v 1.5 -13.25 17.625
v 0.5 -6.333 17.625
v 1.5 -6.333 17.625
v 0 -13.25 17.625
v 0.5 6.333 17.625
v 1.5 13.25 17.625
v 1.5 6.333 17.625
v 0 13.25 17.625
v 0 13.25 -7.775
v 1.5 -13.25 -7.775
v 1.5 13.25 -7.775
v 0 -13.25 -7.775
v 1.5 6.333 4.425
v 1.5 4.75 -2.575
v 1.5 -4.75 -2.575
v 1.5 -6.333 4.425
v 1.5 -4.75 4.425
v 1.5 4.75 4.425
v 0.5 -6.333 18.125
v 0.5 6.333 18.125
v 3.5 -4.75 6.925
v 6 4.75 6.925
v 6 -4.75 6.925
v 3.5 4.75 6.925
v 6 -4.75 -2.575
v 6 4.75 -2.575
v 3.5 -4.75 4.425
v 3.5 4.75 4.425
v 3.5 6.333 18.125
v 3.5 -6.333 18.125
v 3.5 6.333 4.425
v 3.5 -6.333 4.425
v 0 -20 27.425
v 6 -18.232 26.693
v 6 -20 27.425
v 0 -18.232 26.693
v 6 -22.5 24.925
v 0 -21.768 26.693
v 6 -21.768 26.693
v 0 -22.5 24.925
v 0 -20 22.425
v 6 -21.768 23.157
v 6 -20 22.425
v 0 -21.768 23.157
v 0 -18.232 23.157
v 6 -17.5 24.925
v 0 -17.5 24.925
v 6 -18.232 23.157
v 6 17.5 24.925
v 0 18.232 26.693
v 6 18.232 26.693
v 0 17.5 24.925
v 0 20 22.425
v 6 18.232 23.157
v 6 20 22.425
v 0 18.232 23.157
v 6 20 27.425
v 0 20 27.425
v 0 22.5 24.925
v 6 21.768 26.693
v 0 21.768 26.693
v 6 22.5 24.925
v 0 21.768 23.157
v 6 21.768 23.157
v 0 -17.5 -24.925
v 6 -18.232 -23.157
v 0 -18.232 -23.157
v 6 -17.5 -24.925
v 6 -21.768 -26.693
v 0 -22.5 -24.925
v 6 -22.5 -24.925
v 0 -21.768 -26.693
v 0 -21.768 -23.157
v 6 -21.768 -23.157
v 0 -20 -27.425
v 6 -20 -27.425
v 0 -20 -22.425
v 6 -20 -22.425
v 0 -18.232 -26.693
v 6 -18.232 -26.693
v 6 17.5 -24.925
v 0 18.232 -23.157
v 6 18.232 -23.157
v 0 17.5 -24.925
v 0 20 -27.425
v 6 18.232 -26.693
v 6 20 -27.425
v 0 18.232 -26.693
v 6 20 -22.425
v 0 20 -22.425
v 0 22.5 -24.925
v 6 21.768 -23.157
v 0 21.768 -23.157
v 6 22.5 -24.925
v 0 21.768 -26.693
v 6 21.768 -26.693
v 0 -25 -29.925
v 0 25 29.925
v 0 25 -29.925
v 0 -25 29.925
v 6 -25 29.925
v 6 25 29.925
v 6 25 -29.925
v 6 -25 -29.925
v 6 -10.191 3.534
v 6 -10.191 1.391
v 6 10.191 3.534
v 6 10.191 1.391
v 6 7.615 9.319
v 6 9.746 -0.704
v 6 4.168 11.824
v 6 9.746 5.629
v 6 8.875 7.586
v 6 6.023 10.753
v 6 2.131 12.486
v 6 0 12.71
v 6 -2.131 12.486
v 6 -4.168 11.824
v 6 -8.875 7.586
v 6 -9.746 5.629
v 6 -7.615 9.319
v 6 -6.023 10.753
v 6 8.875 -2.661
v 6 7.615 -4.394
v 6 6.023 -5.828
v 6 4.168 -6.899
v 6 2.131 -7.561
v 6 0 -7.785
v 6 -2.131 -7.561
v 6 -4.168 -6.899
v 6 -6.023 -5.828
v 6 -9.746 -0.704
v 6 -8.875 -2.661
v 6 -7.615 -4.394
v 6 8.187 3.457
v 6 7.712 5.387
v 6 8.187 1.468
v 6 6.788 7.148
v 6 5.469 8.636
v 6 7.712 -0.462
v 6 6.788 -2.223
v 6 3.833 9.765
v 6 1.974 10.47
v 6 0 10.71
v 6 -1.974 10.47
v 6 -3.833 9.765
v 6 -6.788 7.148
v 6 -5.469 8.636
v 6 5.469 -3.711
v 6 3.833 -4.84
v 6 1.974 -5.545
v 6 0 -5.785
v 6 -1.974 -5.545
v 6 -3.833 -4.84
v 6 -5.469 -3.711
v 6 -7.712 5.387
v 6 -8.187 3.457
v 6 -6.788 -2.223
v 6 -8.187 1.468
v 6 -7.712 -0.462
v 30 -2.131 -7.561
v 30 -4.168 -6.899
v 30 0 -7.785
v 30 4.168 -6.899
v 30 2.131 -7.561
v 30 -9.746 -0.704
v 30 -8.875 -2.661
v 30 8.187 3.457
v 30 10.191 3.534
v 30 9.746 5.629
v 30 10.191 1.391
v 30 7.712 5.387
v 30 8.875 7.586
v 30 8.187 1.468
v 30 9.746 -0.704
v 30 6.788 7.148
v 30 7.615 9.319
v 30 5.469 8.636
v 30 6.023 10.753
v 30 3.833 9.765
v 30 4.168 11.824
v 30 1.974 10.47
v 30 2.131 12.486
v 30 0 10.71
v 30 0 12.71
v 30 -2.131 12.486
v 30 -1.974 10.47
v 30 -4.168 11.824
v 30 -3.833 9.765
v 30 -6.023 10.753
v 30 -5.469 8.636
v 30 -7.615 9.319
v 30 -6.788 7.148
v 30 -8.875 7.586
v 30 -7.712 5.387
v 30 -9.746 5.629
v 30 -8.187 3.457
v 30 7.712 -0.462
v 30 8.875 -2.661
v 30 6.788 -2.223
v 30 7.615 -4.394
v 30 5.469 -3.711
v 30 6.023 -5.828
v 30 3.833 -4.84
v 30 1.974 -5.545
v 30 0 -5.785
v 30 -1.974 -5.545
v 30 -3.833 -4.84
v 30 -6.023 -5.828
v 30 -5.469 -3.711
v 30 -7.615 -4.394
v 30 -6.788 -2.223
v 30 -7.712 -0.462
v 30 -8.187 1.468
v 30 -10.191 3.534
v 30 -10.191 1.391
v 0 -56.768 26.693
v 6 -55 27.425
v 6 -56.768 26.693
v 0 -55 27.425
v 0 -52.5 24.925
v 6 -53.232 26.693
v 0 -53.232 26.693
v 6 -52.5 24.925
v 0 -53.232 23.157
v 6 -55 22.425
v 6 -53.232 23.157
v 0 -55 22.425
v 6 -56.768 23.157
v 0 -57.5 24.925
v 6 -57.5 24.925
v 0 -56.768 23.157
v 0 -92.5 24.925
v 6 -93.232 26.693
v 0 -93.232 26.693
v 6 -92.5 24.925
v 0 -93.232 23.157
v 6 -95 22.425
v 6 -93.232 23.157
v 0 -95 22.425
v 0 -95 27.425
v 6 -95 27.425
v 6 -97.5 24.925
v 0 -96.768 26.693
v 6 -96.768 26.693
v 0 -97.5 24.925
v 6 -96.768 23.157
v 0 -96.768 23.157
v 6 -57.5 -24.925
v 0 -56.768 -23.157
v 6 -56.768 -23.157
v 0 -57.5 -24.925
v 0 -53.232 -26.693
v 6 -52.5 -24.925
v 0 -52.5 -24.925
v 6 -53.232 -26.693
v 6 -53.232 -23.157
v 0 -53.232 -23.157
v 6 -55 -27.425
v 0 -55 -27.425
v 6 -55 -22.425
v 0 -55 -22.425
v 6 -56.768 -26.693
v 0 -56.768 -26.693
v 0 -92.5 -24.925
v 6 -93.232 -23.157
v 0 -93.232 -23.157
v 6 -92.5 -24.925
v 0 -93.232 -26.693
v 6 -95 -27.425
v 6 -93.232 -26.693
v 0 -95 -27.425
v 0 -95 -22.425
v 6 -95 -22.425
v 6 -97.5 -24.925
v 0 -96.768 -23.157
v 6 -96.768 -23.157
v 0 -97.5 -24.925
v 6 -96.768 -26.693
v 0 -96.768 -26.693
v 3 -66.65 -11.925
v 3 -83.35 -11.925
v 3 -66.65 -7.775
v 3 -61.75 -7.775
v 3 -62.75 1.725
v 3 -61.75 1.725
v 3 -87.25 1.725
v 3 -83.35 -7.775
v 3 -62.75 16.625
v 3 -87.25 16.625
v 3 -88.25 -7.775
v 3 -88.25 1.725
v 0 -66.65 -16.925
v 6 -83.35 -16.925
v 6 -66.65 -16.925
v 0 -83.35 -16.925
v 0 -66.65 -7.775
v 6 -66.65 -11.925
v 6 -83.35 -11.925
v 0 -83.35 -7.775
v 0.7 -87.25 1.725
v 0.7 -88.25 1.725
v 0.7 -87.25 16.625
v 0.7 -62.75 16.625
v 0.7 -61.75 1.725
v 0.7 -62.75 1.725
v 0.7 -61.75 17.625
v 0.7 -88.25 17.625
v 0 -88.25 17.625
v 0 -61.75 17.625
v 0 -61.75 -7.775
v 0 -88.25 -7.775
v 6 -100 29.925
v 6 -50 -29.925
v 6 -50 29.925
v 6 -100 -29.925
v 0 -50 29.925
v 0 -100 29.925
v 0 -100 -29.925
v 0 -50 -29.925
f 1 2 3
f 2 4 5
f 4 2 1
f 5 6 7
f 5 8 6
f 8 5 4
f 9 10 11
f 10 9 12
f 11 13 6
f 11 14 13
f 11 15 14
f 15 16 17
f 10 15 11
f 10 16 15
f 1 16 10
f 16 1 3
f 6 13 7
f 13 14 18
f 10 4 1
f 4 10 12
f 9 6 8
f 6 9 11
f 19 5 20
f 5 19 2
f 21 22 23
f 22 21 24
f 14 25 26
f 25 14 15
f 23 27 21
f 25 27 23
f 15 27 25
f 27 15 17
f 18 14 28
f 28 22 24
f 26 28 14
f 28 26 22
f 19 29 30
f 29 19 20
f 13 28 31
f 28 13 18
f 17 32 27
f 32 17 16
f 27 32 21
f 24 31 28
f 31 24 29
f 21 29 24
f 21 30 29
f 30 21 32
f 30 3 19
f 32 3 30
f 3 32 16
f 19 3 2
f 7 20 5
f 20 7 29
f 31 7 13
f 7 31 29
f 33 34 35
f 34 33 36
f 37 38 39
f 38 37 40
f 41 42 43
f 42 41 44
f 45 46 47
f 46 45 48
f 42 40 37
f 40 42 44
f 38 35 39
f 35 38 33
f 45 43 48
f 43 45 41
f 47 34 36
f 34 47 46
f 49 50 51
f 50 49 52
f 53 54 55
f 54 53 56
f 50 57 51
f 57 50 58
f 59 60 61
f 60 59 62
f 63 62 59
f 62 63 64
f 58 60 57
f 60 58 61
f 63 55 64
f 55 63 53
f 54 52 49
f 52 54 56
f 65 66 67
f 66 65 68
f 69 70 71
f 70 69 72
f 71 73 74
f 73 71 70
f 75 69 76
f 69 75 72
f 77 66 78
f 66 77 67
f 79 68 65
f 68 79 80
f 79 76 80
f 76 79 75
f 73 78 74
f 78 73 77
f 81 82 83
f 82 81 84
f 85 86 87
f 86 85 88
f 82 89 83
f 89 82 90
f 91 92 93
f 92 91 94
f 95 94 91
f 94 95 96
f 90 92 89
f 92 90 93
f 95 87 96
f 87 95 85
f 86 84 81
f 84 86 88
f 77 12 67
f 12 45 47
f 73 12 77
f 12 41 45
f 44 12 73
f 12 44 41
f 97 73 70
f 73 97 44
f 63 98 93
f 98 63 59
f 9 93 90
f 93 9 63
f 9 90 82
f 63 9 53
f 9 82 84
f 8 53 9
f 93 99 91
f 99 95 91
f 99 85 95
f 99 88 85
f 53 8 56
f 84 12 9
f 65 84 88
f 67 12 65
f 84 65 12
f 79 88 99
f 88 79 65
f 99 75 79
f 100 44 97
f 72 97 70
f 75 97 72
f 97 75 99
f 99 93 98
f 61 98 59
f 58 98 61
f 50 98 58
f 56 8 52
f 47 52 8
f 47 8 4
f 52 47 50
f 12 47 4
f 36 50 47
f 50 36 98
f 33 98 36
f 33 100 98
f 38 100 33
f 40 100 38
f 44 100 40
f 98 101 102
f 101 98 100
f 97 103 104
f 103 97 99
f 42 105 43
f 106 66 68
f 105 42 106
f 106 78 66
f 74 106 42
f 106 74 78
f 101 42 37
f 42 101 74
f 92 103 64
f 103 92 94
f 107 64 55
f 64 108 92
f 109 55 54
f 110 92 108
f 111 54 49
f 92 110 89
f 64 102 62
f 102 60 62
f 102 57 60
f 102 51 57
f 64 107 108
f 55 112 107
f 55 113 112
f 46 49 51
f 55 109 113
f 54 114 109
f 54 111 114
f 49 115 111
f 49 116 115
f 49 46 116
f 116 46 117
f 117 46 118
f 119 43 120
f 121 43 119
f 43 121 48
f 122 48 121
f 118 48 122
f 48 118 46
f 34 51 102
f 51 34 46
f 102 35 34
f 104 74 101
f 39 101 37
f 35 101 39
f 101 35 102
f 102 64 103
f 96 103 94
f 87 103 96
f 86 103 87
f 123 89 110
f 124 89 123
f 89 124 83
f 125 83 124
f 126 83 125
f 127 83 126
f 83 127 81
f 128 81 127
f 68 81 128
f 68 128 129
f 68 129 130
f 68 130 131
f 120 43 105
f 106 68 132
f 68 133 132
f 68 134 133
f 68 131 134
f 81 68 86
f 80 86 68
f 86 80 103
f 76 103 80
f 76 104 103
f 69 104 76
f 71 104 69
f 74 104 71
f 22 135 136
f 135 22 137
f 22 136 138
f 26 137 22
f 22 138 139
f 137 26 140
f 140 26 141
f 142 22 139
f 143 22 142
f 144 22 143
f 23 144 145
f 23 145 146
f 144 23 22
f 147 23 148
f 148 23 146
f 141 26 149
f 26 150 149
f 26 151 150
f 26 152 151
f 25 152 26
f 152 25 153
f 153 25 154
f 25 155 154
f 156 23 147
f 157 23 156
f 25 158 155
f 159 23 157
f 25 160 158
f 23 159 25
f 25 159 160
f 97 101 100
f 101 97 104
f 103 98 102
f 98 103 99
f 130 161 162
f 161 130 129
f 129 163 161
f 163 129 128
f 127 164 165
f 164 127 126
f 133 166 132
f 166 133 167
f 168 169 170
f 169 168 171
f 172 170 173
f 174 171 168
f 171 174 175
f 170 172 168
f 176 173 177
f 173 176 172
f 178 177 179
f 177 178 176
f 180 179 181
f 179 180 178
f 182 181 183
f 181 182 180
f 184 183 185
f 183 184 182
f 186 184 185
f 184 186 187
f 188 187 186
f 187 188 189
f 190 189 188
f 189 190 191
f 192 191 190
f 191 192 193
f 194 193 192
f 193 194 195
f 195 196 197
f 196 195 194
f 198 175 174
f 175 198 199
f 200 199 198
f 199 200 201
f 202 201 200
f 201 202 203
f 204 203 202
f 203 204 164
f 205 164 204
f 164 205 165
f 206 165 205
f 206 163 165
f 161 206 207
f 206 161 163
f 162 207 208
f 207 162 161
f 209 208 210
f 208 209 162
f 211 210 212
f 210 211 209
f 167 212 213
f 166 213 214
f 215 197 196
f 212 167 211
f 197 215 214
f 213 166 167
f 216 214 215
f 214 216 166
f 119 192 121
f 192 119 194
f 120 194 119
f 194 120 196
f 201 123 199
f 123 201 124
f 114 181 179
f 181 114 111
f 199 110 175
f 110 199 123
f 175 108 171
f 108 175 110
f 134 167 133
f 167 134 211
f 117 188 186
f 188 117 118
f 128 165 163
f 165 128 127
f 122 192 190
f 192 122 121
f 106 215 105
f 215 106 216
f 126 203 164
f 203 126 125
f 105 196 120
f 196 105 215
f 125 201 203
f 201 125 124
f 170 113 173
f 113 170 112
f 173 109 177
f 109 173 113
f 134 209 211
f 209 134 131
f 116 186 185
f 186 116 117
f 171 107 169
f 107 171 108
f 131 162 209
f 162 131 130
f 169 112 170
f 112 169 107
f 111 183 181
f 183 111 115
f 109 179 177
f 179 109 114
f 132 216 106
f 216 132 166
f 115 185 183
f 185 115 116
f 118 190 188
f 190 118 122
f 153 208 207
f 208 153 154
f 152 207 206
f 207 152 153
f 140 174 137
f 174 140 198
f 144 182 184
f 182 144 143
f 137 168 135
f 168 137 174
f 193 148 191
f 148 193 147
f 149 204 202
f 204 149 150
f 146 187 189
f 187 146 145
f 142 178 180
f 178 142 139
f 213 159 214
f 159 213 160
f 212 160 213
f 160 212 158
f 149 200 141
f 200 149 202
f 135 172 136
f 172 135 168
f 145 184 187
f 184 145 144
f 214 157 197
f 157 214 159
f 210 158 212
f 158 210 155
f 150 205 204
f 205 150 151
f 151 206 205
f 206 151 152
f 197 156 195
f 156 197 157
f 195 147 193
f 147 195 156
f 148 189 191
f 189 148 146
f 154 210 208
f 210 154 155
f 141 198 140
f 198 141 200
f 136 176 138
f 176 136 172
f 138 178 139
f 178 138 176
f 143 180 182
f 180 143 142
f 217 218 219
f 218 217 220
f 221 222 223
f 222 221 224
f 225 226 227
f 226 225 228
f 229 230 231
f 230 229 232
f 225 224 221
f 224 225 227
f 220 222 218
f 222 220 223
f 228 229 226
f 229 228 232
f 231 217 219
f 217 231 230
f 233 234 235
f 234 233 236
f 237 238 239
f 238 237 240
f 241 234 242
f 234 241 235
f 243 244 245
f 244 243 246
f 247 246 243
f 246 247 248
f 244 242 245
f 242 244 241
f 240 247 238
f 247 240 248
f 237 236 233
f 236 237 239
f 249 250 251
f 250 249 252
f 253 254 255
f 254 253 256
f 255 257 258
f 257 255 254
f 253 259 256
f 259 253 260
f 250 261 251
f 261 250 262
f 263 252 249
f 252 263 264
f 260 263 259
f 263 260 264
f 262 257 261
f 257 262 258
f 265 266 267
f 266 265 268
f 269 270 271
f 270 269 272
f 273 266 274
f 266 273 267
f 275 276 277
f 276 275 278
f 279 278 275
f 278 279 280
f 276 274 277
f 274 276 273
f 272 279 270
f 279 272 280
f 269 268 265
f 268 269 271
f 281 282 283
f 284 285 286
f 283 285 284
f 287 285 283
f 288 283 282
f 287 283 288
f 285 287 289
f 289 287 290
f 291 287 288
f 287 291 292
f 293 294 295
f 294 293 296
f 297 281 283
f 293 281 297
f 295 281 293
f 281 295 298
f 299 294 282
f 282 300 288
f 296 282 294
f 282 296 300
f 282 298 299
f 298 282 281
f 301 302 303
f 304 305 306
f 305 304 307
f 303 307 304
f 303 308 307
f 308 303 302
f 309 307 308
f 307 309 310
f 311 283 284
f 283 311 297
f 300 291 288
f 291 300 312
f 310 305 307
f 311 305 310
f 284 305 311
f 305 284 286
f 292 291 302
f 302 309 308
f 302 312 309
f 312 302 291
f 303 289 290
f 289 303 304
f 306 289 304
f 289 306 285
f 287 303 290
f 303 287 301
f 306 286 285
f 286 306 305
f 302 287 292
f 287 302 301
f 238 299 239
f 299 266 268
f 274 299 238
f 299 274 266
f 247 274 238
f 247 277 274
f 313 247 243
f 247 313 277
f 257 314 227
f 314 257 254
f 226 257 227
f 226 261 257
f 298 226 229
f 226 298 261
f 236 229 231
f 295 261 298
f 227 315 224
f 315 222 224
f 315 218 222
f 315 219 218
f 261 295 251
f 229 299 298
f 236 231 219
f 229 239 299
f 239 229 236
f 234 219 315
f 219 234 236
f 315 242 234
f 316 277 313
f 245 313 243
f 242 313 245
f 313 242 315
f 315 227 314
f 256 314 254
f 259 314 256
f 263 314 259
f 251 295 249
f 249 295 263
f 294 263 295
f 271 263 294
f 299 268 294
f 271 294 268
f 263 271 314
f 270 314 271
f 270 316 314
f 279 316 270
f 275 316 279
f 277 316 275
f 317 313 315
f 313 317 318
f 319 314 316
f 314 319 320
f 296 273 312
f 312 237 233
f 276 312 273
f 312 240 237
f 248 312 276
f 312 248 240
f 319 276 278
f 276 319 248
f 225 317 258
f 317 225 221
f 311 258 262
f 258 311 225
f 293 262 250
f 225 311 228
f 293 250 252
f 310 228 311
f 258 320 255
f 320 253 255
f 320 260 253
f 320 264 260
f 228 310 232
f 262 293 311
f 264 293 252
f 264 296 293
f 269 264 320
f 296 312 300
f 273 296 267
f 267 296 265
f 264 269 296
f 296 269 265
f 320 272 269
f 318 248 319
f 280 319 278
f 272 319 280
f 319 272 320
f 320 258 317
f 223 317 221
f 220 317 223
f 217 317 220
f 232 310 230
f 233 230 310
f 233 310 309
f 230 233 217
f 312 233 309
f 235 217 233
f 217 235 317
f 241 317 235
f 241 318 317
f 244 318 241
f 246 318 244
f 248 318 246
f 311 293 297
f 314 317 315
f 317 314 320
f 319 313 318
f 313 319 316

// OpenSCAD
// file: ../cameramount/PiCameraMount.scad
/*
 * openSCAD for a simple mount for the Raspberry PI Camera Module
 *
 * This file is not for standalone use - it's included in to another
 * openSCAN file for including in to another model.
 *
 * Copyright 2015 Peter T Mount
 * 
 * Licensed under the Apache License, Version 2.0 (the "License");
 * you may not use this file except in compliance with the License.
 * You may obtain a copy of the License at
 * 
 * http://www.apache.org/licenses/LICENSE-2.0
 * 
 * Unless required by applicable law or agreed to in writing, software
 * distributed under the License is distributed on an "AS IS" BASIS,
 * WITHOUT WARRANTIES OR CONDITIONS OF ANY KIND, either express or implied.
 * See the License for the specific language governing permissions and
 * limitations under the License.
 *
 */

/*
 * Measured dimensions of a PI Camera Module.
 *
 * These are based on actual measurements and those manually measured by Gert van Loo
 * and published on Scribd:
 *
 *		http://www.scribd.com/doc/142718448/Raspberry-Pi-Camera-Mechanical-Data
 *
 * Width & Depth are the exterior dimensions, width being the edge with the ribbon.
 *
 * We add 1.5 to these to give some room and account for the printer as it seems
 * to give a better fit.
 *
 * y offset is the height from the bottom of the center of the camera lens.
 *
 * ribbon width is just that, if required
 */
piCameraWidth=25 +1.5;
piCameraDepth=23.9 +1.5;
piCameraRibbonWidth=16.2 +0.5;
piCameraLensSize=8 +1.5;
piCameraYOffset=5.1+(piCameraLensSize/2);

/*
 * Module to render a PI camera mount.
 *
 * To use translate it into the required position so that the camera lens
 * is at the origin & pointing along the x axis.
 *
 * Then call piCameraMount(radius,mode)
 *
 * Where:
 *		width	the width of the component
 *		mode	The mode of the render
 *
 * The width must be >30mm as it's used to include the mounting hardware.
 * However you can enlarge it.
 *
 * The mode defines how it's rendered:
 *		0	Render the front panel
 *		1	Render the back panel
 *		2	Render a plain panel with just the mounting holes
 *    3	As 1 but cable exit on back is internal rather than at the bottom of the plate
 */

module piCamera(width,mode) {
	assign(
		tubeRadius=width/2,
		piCameraLensHalf=piCameraLensSize/2,
		piCameraWHalf=piCameraWidth/2,
		piCameraDHalf=piCameraDepth/2,
		offset=piCameraYOffset
	) {
		translate([0,0,piCameraYOffset/2]) union() {
			// Front panel
			difference() {
				if(mode==1 || mode==3)
					translate([6,-tubeRadius,-tubeRadius-offset]) cube([6,width,width+offset]);
				else
					translate([0,-tubeRadius,-tubeRadius-offset]) cube([6,width,width+offset]);

//				translate([4,-tubeRadius-1,-tubeRadius-offset-1]) cube([2,width+2,width+offset+2]);

				if(mode!=2) {
					// Holder for the pi camera module
					translate([4.5,-piCameraWHalf,-piCameraDHalf])
						cube([2.2,piCameraWidth,piCameraDepth]);

					// Holder for components on rear of module
					translate([6,1-piCameraWHalf,1-piCameraDHalf])
						cube([3,piCameraWidth-2,piCameraDepth-2]);
					translate([6,-piCameraWHalf,-piCameraDHalf])
						cube([3,piCameraWidth,9.5]);

					// Hole for the camera lens
					translate([-0.5,-piCameraLensHalf,2-piCameraLensSize])
						cube([6,piCameraLensSize,piCameraLensSize]);

					// Indent for ribbon holder on front of the module
					translate([2.5,-piCameraLensSize*2/3,-0.5])
						cube([3,piCameraLensSize*4/3,piCameraDHalf+1]);
		
					// Space for ribbon cable
					if(mode==1)
						translate([ 5, -piCameraRibbonWidth/2,-tubeRadius-1-offset])
							cube([3,piCameraRibbonWidth,tubeRadius+1+offset]);
					else if(mode==3) {
						translate([ 5, -piCameraRibbonWidth/2,14-tubeRadius-1-offset])
							cube([4,piCameraRibbonWidth,15]);
						translate([ 5, -piCameraRibbonWidth/2,14-tubeRadius-1-offset])
							cube([10,piCameraRibbonWidth,5]);
					}
				}

				// M4 mounting holes
				piCameraHoles(width,15);
			}
		}

	}
}

module piCameraHoles(width,h) {
	assign(tubeRadius=width/2) {
		for(h=[0:3])
			translate([-1,
				(h%2) ? (-tubeRadius+5) : (tubeRadius-5),
				(floor(h/2)) ? (-tubeRadius+5-piCameraYOffset) : (tubeRadius-5)
			])
			rotate([0,90,0])
			cylinder(h=15,r=2.5);
	}
}
// file: ../Common.scad
/*
 * openSCAD Common features
 *
 * This file is not for standalone use - it's included in to another
 * openSCAN file for including in to another model.
 *
 * Copyright 2015 Peter T Mount
 * 
 * Licensed under the Apache License, Version 2.0 (the "License");
 * you may not use this file except in compliance with the License.
 * You may obtain a copy of the License at
 * 
 * http://www.apache.org/licenses/LICENSE-2.0
 * 
 * Unless required by applicable law or agreed to in writing, software
 * distributed under the License is distributed on an "AS IS" BASIS,
 * WITHOUT WARRANTIES OR CONDITIONS OF ANY KIND, either express or implied.
 * See the License for the specific language governing permissions and
 * limitations under the License.
 *
 */

/*
 * Bolt sizes - these are for the holes hence +0.25mm, measurements in radius
 */
M4=2.25;
M5=2.75;
M6=3.25;
// file: eyepiece.scad
/*
 * openSCAD for an adapter for attaching the Raspberry PI Camera Module 
 * to a telescope.
 *
 * This model comes in two parts, the eyepiece mount which attaches directly
 * to the telescope (no eyepiece required) and the back plate.
 *
 * However it's intended that the backplate be incorporated into another model
 * so that the PI itself is mounted with the camera.
 *
 * Copyright 2015 Peter T Mount
 * 
 * Licensed under the Apache License, Version 2.0 (the "License");
 * you may not use this file except in compliance with the License.
 * You may obtain a copy of the License at
 * 
 * http://www.apache.org/licenses/LICENSE-2.0
 * 
 * Unless required by applicable law or agreed to in writing, software
 * distributed under the License is distributed on an "AS IS" BASIS,
 * WITHOUT WARRANTIES OR CONDITIONS OF ANY KIND, either express or implied.
 * See the License for the specific language governing permissions and
 * limitations under the License.
 *
 */

include <../Common.scad>
include <../cameramount/PiCameraMount.scad>

module eyepiece(diam,mode) {
	// eyediam is the eyepiece diameter, adjusting for extruder diameter
	assign(
		eyediam=(diam*25.4)-3
	) {
		assign(
			eyerad=eyediam/2,
			eyewidth=max(50,eyediam+10)
		) {
			if(mode==0 || mode==2) translate([-6,0,0]) eyepieceFront(eyewidth,eyerad);
			if(mode==1 || mode==2) translate([-6,0,0]) eyepieceBack(eyewidth);
			if(mode==3) {
			  	translate([6,0,0]) rotate([0,0,180]) eyepieceFront(eyewidth,eyerad);
				translate([-6,-eyewidth*3/2,0]) eyepieceBack(eyewidth);
			}
		}
	}
}

module eyepieceFront(eyewidth,eyerad) {
	union() {
		piCamera(eyewidth,0);
		translate([-24,0,piCameraYOffset/4]) rotate([0,90,0]) difference() {
			cylinder( h=24,r=eyerad);
			translate([0,0,-2]) cylinder( h=27,r=eyerad-2);
		}
	}
}

module eyepieceBack(eyewidth) {
	piCamera(eyewidth,3);
}
// main file
/*
 * openSCAD for an adapter for attaching the Raspberry PI Camera Module 
 * to a telescope.
 *
 * This model comes in two parts, the eyepiece mount which attaches directly
 * to the telescope (no eyepiece required) and the back plate.
 *
 * However it's intended that the backplate be incorporated into another model
 * so that the PI itself is mounted with the camera.
 *
 * Copyright 2015 Peter T Mount
 * 
 * Licensed under the Apache License, Version 2.0 (the "License");
 * you may not use this file except in compliance with the License.
 * You may obtain a copy of the License at
 * 
 * http://www.apache.org/licenses/LICENSE-2.0
 * 
 * Unless required by applicable law or agreed to in writing, software
 * distributed under the License is distributed on an "AS IS" BASIS,
 * WITHOUT WARRANTIES OR CONDITIONS OF ANY KIND, either express or implied.
 * See the License for the specific language governing permissions and
 * limitations under the License.
 *
 */

include <eyepiece.scad>

eyepiece(0.925,3);
